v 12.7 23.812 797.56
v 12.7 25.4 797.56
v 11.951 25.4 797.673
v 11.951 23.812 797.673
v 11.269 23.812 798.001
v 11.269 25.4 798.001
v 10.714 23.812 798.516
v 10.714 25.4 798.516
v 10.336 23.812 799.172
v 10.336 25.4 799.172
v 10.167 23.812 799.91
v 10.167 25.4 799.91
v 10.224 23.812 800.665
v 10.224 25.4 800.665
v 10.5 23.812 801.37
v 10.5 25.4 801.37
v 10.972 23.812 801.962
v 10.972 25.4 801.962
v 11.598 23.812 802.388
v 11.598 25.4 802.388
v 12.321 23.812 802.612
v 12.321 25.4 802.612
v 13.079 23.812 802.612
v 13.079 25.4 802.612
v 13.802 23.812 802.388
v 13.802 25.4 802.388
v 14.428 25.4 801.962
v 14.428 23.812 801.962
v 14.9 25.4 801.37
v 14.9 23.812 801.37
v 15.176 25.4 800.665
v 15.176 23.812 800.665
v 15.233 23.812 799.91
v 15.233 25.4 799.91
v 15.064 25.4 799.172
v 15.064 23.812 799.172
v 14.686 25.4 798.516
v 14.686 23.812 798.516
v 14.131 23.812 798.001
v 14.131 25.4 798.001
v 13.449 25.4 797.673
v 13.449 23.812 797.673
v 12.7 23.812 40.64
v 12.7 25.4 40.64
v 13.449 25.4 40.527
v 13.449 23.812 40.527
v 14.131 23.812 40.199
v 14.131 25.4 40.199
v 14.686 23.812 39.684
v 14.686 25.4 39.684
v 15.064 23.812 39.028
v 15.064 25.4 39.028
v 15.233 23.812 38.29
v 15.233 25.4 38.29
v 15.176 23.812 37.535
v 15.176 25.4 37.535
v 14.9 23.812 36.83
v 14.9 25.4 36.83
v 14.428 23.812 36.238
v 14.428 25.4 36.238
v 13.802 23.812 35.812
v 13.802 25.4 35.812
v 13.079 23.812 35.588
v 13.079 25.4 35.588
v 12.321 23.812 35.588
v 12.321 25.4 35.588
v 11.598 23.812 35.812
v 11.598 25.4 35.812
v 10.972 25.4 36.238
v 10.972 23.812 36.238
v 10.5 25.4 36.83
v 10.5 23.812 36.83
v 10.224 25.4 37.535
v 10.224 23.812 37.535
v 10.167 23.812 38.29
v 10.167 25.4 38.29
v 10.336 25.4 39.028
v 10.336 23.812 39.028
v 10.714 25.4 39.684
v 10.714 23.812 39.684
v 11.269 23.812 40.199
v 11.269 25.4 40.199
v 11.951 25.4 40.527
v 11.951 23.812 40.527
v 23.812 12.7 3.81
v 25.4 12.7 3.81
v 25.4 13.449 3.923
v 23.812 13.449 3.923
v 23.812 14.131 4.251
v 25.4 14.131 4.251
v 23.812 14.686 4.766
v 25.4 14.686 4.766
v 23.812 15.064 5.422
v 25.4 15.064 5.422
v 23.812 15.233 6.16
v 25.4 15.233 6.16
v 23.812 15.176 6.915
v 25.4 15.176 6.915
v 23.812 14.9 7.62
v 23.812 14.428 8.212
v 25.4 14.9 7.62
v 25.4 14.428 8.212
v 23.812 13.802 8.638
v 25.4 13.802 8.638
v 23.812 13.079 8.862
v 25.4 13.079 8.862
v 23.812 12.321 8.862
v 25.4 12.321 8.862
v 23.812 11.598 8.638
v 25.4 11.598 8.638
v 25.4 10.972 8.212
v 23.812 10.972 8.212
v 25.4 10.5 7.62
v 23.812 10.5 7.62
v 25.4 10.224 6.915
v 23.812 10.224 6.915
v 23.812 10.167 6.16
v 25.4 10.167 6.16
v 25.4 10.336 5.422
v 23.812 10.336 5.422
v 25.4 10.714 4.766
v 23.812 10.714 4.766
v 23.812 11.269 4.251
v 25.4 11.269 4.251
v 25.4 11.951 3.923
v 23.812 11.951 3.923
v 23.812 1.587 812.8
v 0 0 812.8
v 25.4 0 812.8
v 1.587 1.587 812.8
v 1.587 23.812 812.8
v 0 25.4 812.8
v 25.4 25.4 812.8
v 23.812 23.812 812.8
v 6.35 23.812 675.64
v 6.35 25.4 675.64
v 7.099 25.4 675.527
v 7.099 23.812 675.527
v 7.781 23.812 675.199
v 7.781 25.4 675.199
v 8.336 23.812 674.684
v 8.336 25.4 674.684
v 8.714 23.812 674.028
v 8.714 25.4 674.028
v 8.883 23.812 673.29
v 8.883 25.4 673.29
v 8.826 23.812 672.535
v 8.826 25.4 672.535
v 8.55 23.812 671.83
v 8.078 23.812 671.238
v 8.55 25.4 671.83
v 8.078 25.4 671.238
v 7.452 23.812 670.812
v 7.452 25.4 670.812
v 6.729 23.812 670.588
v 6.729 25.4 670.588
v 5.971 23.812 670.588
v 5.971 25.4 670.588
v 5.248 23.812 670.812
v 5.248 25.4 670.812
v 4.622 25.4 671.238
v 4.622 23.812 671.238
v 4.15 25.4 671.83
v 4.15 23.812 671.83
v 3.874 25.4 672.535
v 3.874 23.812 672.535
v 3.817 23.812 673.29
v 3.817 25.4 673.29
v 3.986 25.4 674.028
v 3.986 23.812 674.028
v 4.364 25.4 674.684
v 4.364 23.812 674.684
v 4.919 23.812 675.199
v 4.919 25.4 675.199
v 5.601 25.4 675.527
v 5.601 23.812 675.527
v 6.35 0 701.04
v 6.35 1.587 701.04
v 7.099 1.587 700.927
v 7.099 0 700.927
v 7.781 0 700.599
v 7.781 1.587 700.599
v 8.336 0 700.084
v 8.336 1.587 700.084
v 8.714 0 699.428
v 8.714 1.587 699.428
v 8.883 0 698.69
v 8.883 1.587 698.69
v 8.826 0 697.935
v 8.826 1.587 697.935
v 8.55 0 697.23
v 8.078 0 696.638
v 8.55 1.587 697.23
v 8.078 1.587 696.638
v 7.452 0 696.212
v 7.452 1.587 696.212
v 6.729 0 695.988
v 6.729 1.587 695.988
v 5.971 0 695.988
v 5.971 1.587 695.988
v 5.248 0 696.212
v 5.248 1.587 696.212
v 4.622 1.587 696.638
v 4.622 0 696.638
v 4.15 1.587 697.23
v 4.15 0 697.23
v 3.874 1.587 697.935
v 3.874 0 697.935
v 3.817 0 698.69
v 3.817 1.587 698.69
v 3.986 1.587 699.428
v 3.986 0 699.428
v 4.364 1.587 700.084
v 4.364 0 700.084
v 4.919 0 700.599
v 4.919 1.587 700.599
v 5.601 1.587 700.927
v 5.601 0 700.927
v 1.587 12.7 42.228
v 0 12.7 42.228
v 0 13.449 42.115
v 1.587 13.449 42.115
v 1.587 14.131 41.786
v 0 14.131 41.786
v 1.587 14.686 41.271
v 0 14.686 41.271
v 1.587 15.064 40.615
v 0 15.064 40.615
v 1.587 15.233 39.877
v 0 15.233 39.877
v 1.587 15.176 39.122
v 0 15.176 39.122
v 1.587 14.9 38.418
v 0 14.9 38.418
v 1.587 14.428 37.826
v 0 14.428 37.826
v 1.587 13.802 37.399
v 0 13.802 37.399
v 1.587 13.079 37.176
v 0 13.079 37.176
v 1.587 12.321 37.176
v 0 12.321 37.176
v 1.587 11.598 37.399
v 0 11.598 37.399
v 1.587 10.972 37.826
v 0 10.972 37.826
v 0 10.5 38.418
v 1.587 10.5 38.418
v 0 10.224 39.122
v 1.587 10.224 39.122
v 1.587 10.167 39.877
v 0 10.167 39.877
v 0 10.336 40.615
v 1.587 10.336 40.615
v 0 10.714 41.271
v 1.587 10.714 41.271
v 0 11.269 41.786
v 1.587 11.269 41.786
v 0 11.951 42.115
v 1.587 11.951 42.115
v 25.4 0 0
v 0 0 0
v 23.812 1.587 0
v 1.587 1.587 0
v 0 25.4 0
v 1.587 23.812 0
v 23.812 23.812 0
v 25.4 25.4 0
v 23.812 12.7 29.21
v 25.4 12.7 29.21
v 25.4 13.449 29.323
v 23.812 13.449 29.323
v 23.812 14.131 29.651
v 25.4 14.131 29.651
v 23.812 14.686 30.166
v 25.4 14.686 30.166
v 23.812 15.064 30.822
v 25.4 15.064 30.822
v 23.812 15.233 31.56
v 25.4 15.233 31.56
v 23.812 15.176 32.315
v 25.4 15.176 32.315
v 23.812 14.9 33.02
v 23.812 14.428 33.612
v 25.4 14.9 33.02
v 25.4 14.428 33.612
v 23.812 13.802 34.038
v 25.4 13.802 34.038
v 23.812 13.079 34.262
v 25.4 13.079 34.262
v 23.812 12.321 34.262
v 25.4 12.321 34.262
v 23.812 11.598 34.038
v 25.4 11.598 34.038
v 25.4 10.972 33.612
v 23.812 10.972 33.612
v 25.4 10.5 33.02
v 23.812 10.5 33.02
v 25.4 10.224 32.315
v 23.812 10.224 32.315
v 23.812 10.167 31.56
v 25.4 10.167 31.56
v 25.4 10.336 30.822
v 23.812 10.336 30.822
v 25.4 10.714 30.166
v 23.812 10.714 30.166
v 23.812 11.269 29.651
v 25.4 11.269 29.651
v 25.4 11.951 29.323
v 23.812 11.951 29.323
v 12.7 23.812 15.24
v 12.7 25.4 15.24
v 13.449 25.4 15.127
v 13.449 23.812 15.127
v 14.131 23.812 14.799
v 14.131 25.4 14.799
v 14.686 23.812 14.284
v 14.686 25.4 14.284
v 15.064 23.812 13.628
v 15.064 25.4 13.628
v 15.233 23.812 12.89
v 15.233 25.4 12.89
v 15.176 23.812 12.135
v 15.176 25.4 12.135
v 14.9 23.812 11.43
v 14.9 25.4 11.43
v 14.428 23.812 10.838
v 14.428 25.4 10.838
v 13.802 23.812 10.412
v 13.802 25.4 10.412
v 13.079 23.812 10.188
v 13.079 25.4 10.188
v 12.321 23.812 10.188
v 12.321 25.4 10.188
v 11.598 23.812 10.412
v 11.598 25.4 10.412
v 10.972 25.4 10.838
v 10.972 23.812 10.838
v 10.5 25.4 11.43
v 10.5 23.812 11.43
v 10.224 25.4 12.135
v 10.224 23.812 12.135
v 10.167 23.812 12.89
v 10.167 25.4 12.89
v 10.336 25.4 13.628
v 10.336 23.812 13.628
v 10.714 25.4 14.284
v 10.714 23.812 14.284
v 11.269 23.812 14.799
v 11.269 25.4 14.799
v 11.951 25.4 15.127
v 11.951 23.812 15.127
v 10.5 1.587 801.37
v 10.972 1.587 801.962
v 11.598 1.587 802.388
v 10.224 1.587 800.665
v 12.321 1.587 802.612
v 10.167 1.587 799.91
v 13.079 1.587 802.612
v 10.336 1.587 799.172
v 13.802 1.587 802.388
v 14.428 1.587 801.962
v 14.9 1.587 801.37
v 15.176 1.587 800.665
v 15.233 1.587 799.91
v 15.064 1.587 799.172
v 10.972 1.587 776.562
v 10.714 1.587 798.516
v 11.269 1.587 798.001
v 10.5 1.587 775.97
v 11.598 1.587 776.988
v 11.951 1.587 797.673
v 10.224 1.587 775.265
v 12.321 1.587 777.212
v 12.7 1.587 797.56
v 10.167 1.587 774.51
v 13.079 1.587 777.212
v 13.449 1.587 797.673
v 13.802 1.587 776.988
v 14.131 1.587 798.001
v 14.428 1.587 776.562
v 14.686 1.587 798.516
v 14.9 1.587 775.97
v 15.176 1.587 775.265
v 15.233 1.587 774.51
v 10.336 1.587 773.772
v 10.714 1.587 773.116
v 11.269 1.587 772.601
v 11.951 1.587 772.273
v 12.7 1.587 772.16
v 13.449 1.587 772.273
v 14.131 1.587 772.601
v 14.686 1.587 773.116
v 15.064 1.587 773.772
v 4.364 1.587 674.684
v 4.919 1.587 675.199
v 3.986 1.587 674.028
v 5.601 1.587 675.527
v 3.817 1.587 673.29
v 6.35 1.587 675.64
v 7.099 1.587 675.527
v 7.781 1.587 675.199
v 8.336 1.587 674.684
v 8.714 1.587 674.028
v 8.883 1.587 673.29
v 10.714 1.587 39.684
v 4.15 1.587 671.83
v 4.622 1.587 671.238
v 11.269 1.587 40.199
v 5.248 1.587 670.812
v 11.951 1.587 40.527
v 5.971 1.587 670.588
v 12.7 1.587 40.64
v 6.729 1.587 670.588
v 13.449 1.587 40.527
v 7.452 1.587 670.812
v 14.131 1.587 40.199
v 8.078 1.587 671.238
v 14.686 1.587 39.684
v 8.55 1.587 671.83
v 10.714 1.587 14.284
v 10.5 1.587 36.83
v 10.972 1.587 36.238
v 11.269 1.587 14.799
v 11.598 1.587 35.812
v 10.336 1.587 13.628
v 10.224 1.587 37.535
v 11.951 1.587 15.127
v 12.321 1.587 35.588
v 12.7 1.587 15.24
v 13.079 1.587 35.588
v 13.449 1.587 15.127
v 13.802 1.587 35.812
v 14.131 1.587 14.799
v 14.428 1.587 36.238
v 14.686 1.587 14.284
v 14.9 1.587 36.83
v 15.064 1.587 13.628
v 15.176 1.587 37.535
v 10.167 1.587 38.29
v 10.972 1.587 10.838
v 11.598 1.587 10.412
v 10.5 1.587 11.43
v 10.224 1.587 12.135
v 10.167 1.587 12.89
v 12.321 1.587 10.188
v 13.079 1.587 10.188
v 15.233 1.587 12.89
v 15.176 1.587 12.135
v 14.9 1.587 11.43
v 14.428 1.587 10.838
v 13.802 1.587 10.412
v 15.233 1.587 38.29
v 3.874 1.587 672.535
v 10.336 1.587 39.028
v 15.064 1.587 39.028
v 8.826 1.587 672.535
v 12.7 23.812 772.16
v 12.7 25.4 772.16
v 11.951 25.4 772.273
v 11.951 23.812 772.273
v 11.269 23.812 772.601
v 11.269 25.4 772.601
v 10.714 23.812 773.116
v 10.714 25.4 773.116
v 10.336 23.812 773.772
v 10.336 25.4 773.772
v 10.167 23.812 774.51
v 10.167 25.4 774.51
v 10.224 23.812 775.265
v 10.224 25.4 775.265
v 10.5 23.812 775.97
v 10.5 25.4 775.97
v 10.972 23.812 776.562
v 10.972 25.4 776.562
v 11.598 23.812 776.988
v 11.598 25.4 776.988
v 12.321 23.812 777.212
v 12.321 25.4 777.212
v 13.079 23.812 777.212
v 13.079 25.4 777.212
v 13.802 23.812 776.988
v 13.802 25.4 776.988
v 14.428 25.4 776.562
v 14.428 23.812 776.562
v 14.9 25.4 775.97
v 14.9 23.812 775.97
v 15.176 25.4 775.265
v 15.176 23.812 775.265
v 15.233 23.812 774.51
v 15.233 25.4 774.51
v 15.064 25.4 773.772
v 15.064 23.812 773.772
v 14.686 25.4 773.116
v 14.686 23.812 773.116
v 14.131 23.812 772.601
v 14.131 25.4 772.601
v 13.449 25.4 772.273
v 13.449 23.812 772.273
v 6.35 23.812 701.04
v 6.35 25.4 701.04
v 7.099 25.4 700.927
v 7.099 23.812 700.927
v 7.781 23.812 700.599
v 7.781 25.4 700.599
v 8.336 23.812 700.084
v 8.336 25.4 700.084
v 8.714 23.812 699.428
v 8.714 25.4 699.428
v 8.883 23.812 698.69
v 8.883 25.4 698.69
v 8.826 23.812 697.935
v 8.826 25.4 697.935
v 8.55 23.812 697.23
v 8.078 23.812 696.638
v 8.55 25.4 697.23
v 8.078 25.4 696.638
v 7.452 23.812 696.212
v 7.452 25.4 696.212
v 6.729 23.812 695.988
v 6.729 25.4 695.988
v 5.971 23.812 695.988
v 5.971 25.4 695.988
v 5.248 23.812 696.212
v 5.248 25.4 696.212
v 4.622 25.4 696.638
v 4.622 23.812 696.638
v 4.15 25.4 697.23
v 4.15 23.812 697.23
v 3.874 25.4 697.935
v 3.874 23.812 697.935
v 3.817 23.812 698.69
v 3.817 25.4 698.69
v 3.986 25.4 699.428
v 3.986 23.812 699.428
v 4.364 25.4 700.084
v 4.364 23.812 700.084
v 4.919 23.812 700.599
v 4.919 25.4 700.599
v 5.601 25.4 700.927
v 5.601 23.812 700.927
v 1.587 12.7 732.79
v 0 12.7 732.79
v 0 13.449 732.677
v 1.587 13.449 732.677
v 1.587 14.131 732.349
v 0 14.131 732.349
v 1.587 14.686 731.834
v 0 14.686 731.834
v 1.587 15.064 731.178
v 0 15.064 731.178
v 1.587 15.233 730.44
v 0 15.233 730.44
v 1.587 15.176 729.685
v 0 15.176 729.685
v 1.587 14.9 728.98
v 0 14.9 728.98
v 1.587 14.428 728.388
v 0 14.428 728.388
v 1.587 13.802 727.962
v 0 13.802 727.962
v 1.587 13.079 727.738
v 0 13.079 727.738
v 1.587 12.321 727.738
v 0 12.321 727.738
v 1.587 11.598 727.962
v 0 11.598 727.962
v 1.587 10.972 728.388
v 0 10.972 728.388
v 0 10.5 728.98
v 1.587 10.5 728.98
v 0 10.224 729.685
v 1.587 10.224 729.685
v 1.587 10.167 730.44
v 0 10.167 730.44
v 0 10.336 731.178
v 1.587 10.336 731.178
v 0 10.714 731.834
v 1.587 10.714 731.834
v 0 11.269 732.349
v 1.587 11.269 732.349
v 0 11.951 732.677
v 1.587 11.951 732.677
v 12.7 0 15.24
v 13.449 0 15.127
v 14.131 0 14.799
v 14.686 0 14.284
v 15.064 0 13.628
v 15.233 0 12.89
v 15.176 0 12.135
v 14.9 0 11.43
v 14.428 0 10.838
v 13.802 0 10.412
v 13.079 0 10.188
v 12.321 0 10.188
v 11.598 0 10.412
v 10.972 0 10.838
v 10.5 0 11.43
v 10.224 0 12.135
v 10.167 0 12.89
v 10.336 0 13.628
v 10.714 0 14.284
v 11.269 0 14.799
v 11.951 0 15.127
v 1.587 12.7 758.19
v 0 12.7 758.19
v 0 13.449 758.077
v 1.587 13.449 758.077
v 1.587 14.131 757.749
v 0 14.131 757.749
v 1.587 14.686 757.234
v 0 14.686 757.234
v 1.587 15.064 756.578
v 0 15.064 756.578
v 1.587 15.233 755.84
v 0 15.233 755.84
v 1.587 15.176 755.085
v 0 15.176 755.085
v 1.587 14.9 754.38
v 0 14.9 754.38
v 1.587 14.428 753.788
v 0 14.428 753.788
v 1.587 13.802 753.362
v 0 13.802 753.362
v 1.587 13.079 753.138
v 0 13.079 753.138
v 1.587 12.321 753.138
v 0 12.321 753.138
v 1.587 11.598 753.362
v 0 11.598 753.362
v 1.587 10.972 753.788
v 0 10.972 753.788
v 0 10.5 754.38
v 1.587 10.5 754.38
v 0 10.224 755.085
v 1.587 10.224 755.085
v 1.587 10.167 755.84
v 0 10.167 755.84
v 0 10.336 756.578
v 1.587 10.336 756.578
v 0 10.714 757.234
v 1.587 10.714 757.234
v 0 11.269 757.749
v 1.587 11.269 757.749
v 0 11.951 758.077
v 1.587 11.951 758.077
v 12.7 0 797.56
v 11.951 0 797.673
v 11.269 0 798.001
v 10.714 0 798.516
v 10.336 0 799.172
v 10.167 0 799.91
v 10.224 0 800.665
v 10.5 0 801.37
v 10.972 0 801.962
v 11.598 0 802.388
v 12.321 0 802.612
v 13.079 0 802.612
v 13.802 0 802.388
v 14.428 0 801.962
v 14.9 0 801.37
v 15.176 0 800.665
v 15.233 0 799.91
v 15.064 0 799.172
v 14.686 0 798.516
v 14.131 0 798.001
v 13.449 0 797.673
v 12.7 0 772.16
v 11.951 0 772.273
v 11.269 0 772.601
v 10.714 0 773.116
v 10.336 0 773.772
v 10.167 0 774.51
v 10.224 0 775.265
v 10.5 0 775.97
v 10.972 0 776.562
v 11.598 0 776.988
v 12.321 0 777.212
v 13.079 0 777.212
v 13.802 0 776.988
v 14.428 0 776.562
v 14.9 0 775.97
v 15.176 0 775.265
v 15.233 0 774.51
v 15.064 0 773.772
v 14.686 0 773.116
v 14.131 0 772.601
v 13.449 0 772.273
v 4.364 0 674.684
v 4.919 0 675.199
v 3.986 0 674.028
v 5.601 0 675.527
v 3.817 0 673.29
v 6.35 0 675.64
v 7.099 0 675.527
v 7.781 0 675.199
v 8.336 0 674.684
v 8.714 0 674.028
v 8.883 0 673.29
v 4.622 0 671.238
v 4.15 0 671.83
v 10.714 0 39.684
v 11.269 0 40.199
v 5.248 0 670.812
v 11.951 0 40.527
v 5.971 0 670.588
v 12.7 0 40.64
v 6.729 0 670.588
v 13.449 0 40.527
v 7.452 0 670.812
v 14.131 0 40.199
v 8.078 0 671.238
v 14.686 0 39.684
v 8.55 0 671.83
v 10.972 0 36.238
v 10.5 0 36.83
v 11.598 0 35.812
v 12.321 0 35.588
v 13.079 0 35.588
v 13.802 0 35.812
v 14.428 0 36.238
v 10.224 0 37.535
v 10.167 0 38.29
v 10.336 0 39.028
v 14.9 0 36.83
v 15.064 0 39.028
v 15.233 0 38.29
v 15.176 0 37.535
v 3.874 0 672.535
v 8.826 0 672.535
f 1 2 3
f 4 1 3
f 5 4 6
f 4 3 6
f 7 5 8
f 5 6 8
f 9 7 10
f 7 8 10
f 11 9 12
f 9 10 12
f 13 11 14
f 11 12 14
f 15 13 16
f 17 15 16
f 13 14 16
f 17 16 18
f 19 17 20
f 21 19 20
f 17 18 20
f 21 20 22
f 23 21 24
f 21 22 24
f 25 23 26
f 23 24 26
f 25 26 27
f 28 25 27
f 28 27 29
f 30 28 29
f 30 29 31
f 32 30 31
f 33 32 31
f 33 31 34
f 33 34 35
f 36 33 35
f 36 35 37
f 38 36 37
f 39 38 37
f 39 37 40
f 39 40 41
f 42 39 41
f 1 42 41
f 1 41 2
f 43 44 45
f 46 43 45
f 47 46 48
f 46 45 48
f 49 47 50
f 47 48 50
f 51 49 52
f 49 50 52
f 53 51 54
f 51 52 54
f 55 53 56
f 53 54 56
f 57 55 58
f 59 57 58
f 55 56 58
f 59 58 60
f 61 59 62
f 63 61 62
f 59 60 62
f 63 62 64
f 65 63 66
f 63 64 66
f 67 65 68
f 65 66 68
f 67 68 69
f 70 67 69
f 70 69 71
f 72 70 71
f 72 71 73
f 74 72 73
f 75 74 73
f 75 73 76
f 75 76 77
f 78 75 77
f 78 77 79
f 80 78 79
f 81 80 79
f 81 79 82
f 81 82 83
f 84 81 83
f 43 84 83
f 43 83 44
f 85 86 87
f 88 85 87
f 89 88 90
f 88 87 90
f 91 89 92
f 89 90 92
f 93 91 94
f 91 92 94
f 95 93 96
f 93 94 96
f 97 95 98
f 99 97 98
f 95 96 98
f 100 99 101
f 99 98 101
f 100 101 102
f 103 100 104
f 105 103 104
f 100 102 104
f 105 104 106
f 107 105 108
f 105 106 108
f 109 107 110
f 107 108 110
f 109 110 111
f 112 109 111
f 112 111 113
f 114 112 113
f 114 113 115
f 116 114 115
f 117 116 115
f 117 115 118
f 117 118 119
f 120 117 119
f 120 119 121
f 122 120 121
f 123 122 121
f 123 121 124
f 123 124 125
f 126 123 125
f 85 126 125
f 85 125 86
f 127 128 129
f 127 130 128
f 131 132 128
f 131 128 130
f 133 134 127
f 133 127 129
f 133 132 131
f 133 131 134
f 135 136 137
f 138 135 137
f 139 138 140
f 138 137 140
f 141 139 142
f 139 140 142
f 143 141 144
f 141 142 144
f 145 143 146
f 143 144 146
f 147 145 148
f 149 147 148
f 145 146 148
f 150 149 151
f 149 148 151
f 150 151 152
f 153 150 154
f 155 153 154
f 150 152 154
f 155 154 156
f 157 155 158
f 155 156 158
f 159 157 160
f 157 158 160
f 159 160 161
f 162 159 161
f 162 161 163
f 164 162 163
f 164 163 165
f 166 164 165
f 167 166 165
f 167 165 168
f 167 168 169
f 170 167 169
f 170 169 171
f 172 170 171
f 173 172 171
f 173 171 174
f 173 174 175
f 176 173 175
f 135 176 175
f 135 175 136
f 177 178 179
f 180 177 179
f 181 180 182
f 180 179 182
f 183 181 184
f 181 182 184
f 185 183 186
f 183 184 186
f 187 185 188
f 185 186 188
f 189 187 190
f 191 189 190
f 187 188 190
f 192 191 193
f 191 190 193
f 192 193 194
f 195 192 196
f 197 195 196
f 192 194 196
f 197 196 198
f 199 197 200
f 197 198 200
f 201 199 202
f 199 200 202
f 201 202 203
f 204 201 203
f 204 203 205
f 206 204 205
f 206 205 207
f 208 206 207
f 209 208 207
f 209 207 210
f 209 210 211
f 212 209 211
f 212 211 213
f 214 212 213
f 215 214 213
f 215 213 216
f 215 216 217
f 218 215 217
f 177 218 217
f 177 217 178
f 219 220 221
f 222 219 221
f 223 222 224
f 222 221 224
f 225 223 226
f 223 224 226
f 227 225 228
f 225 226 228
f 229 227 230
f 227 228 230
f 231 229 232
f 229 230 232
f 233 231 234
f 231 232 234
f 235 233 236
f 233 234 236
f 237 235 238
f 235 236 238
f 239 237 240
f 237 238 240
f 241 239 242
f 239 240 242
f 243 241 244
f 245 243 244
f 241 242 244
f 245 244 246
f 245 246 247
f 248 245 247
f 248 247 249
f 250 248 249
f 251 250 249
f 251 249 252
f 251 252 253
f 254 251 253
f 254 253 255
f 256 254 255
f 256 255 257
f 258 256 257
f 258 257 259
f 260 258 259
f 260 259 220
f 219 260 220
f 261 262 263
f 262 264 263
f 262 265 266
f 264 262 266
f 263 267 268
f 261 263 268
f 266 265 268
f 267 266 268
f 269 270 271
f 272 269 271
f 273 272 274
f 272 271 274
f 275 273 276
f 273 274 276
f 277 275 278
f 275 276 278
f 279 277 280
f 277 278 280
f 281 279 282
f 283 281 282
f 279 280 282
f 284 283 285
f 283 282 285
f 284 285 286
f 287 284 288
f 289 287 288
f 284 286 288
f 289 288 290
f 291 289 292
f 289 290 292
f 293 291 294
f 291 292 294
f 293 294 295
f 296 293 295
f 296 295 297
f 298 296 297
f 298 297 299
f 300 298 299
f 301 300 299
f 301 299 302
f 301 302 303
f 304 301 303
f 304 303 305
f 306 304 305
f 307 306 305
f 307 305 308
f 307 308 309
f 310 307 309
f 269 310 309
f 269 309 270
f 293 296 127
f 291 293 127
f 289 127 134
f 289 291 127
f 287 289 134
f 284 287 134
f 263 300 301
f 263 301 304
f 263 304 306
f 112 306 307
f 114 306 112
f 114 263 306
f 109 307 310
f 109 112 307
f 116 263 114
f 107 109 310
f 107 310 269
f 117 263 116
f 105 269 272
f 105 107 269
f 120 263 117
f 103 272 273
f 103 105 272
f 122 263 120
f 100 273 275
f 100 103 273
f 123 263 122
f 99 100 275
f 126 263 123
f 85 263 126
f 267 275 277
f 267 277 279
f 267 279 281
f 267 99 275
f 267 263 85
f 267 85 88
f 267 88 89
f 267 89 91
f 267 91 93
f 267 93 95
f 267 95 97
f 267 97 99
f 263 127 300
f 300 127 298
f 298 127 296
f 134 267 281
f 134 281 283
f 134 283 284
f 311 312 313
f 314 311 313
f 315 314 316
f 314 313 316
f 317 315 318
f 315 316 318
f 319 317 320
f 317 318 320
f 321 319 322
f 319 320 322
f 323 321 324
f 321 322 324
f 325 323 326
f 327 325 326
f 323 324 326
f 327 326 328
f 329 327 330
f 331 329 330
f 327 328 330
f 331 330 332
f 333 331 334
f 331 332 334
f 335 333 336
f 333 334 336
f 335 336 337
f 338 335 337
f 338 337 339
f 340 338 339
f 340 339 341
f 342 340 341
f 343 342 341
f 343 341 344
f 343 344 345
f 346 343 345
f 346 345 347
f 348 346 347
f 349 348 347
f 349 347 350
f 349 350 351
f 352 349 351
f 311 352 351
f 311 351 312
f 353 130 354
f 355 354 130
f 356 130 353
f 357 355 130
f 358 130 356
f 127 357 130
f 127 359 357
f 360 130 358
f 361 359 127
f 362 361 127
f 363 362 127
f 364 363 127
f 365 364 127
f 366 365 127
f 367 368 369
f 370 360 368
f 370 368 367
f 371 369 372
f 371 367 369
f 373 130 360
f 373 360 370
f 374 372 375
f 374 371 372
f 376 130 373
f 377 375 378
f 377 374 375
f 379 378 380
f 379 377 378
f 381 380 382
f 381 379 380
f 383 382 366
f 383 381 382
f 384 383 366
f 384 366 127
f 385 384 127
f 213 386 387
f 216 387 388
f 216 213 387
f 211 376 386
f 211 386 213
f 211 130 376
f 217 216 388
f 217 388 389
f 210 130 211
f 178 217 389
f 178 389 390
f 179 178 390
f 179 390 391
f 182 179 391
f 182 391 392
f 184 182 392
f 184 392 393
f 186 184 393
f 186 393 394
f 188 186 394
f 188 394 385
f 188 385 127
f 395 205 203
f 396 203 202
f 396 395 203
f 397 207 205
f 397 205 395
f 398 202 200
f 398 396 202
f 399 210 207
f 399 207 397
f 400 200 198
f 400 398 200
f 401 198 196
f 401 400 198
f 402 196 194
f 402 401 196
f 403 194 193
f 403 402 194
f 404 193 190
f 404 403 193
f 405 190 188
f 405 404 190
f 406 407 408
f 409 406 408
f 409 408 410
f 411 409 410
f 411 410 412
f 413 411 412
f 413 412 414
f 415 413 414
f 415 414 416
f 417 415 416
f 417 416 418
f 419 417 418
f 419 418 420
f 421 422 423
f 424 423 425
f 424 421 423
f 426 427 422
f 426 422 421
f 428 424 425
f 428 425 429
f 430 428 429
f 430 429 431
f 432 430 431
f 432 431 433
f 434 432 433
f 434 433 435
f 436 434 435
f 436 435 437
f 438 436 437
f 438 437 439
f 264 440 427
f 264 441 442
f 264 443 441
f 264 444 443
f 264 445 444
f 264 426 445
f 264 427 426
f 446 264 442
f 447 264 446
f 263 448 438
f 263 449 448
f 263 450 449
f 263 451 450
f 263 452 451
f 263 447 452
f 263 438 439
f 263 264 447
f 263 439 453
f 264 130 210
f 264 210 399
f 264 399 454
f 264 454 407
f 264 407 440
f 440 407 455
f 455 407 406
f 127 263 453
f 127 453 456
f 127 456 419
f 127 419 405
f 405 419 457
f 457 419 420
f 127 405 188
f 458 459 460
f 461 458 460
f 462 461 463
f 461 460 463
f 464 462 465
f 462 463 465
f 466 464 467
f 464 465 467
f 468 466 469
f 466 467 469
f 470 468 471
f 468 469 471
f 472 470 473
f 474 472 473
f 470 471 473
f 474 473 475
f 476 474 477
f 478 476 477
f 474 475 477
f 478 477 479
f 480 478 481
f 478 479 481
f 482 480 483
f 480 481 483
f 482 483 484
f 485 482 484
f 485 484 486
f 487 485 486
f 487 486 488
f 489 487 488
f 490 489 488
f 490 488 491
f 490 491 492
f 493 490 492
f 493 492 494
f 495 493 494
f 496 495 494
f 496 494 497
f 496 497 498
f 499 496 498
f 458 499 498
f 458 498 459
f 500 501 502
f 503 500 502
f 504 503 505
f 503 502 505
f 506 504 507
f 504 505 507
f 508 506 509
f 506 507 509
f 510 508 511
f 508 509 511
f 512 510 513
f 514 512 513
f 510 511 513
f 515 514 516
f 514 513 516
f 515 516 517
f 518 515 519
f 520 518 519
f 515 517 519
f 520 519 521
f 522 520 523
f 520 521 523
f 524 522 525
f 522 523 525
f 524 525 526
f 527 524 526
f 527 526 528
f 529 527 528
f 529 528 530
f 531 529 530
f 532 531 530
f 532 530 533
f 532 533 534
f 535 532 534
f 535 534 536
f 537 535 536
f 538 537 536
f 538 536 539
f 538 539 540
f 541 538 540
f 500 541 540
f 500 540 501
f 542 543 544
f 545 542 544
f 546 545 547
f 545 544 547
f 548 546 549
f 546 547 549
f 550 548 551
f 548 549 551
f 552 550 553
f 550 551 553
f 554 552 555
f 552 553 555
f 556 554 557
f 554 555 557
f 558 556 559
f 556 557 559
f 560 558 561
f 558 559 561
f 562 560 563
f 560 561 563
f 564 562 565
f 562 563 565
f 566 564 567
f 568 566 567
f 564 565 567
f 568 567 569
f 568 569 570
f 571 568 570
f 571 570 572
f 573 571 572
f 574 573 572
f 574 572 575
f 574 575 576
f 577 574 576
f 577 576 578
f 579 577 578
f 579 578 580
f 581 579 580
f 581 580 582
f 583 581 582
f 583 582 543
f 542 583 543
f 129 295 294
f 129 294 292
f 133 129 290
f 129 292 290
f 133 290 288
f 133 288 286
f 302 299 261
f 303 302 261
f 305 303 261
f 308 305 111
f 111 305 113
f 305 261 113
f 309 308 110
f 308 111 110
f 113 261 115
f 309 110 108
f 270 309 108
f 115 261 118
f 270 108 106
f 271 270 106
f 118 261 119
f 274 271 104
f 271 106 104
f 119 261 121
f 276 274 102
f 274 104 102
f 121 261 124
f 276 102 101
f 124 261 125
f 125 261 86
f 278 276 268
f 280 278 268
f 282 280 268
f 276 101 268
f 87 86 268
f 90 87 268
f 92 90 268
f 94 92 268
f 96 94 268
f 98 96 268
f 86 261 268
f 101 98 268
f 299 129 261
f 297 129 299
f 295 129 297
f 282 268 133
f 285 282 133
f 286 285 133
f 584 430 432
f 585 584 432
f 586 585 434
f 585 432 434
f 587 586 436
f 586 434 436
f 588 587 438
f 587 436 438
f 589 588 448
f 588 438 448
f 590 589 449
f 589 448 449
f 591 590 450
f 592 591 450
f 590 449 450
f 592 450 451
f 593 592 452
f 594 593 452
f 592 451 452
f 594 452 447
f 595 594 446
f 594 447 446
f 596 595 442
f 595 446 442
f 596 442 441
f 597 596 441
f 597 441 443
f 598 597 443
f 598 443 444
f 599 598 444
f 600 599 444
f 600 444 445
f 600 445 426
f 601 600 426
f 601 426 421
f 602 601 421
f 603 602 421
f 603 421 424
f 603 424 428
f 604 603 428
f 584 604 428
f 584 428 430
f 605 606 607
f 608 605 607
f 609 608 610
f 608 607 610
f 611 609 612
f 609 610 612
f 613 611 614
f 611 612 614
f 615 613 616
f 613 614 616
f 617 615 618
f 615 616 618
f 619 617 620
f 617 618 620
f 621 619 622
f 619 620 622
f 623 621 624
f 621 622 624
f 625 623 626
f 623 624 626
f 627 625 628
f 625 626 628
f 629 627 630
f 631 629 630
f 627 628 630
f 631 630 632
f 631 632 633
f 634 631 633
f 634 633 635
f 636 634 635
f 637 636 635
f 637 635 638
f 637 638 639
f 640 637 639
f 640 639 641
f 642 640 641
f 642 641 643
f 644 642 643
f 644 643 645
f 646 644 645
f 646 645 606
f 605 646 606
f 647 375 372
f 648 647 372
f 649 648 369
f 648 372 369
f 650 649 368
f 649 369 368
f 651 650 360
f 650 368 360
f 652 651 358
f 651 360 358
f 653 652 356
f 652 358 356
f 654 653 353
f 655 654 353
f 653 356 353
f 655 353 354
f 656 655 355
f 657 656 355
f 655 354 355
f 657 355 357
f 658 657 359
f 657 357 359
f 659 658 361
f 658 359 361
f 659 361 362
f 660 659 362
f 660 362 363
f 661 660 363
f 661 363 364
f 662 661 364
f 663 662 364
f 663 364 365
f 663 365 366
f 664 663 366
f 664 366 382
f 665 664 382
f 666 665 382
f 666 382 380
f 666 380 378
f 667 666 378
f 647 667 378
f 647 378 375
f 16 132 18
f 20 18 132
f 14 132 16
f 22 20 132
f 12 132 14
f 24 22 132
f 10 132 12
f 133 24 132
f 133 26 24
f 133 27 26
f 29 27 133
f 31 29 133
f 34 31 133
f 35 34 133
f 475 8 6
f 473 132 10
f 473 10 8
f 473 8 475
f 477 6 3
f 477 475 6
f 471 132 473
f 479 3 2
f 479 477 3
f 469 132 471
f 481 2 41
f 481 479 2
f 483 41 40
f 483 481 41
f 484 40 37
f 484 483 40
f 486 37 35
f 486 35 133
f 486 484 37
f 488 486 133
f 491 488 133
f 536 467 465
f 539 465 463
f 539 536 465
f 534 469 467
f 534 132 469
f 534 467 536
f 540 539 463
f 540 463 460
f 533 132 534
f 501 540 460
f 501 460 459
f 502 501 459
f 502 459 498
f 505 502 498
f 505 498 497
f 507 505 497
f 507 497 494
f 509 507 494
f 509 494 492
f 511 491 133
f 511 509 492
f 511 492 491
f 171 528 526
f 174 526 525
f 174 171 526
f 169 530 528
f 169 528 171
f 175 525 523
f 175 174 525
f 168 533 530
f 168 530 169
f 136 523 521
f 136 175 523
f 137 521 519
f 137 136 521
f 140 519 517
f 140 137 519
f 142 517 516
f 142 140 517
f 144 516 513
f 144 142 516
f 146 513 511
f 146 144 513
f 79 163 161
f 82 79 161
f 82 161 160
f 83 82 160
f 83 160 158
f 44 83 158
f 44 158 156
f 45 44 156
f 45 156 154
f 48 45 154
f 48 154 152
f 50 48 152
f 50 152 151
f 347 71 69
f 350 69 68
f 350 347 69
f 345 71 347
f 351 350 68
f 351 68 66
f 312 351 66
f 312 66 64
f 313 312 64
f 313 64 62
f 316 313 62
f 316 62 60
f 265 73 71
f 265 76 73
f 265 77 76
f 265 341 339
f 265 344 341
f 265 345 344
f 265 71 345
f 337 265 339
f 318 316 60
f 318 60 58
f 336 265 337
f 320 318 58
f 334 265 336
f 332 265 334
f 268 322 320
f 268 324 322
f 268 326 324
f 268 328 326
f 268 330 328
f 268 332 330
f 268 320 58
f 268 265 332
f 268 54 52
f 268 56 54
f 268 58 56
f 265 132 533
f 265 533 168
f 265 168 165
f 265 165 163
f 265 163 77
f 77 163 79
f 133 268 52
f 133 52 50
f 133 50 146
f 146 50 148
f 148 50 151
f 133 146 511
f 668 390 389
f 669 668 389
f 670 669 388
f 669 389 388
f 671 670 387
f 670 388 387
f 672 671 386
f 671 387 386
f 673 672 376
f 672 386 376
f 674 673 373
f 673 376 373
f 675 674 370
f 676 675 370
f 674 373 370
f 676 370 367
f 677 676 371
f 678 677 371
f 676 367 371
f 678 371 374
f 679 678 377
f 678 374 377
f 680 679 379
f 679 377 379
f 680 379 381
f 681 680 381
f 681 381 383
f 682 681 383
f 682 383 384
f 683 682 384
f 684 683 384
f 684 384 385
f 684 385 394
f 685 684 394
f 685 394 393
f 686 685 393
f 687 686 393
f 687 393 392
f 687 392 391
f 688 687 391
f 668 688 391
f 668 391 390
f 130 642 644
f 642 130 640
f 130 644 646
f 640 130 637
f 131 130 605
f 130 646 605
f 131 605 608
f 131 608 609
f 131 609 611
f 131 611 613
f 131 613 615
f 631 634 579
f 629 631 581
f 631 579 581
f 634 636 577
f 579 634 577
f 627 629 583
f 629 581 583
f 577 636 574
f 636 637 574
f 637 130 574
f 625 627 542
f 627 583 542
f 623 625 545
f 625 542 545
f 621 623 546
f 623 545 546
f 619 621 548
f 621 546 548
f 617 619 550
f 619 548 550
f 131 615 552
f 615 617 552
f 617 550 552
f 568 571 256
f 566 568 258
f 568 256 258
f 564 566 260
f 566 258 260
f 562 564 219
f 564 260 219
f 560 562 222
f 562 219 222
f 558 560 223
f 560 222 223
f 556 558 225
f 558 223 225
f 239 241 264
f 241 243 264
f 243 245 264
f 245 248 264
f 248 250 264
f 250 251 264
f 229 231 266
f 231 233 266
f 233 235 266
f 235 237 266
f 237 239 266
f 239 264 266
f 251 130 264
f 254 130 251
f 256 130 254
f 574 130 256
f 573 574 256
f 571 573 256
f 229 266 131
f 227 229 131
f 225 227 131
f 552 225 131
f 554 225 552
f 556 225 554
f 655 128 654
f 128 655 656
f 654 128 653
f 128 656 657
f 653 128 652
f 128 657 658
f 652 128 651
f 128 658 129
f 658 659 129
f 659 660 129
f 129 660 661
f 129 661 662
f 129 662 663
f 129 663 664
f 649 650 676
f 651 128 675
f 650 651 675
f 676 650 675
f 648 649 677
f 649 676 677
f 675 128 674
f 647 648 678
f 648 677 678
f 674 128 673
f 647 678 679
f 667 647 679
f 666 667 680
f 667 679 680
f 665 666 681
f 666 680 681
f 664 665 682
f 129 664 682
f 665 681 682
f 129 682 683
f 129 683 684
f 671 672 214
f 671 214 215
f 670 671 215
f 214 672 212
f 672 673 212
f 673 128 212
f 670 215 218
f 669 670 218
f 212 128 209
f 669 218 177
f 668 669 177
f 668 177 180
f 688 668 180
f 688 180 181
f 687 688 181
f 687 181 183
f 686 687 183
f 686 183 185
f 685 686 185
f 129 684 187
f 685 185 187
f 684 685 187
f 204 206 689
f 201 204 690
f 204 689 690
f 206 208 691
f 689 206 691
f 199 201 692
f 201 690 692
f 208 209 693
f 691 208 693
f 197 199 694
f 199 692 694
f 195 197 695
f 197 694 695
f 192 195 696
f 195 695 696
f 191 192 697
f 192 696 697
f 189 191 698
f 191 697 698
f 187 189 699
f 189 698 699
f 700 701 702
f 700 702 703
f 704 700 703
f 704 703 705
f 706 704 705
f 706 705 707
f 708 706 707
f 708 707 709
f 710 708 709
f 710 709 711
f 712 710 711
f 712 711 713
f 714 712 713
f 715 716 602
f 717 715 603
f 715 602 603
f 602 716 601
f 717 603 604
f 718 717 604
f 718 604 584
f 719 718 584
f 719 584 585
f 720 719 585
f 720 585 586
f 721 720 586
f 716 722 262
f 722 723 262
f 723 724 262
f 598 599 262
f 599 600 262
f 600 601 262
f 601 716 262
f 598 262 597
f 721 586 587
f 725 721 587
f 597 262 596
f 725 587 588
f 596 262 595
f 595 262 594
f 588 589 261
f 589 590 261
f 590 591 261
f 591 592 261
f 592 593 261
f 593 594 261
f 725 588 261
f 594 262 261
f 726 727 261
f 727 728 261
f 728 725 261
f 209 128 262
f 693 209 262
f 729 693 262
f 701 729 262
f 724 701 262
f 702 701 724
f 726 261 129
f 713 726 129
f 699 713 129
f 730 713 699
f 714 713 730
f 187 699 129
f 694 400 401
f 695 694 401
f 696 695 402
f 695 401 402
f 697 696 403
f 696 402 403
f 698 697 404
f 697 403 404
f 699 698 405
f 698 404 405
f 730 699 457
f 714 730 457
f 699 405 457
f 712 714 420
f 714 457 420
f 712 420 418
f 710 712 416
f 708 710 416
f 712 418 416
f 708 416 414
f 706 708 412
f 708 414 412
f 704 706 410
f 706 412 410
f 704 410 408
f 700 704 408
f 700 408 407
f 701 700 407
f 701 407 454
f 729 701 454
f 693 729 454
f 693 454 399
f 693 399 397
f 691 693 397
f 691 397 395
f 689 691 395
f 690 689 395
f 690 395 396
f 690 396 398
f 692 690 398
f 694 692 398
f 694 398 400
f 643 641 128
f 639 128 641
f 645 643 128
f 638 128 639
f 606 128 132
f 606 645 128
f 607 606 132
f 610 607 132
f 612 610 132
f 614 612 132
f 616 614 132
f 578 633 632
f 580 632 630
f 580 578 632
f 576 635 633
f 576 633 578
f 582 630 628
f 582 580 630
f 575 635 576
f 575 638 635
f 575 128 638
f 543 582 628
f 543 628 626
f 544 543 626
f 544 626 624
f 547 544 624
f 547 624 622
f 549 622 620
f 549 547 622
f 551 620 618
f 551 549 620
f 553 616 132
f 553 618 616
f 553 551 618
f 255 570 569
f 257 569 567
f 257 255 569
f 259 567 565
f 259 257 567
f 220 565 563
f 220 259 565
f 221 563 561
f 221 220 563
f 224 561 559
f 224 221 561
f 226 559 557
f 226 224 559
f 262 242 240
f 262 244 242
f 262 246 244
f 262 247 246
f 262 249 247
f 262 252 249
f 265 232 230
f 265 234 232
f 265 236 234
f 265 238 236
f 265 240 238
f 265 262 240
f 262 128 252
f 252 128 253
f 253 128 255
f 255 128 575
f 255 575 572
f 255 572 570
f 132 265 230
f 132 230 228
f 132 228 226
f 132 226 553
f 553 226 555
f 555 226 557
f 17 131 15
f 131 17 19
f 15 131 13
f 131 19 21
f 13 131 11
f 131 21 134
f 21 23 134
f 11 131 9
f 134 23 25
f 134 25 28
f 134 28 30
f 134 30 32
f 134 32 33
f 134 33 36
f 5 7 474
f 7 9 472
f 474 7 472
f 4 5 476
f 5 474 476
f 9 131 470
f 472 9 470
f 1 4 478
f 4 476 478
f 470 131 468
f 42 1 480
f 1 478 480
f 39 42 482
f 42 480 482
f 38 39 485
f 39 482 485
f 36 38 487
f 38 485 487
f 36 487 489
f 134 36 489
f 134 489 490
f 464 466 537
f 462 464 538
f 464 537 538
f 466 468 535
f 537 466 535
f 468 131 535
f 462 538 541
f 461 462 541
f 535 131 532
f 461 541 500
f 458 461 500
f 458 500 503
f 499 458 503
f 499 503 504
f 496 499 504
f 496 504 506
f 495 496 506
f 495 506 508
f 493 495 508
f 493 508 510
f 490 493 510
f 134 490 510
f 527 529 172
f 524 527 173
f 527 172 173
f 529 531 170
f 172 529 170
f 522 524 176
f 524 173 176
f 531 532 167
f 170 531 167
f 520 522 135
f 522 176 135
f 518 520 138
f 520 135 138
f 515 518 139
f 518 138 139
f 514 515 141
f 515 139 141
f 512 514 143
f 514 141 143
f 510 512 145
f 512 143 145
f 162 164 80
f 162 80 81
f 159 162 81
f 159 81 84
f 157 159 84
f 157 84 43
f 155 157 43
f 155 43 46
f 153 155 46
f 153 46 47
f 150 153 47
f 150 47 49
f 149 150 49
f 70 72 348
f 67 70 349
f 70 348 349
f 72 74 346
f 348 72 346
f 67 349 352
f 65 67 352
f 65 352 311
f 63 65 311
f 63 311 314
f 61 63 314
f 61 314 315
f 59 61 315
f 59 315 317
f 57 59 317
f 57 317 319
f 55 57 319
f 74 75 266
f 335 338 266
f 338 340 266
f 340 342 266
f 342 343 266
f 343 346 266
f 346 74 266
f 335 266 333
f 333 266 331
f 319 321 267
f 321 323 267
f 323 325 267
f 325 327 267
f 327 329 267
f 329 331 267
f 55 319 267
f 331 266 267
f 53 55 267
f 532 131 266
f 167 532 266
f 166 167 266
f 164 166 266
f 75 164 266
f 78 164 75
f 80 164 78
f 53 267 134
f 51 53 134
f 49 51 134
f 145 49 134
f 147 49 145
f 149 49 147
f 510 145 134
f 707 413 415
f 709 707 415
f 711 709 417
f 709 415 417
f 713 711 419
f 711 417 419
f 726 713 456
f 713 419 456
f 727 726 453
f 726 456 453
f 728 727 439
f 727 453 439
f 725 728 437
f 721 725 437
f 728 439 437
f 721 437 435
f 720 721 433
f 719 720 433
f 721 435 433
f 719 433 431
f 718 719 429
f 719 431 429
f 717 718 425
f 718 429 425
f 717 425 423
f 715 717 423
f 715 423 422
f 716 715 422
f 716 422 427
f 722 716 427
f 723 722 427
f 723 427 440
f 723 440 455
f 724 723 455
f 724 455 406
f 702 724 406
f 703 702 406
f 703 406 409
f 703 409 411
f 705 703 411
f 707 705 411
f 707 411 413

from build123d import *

# Parameters (mm, degrees)
SKETCH1_W           = 25.4
SKETCH1_H           = 25.4
SKETCH1_W_2         = 22.225
SKETCH1_H_2         = 22.225
BOSS_EXTRUDE1_DEPTH = 812.8
SKETCH3_R           = 2.54
CUT_EXTRUDE2_DEPTH  = 814.593362805
CUT_EXTRUDE3_REACH  = 815.593
SKETCH4_R           = 2.54
CUT_EXTRUDE4_REACH  = 815.593
SKETCH5_R           = 2.54


with BuildPart() as part:
    # Sketch1 → Boss-Extrude1 (new body)
    with BuildSketch(Plane.XY):
        with Locations((12.7, 12.7)):
            Rectangle(SKETCH1_W, SKETCH1_H)
        with Locations((12.7, 12.7)):
            Rectangle(SKETCH1_W_2, SKETCH1_H_2, mode=Mode.SUBTRACT)
    extrude(amount=BOSS_EXTRUDE1_DEPTH)

    # Sketch3 → Cut-Extrude2 (cut, through all)
    with BuildSketch(Plane(origin=(0, 25.4, 0), x_dir=(1, 0, 0), z_dir=(0, 1, 0))):
        with Locations(Location((12.7, -12.7, 0), (0, 0, 270))):
            Circle(SKETCH3_R)
        with Locations(Location((12.7, -38.1, 0), (0, 0, 270))):
            Circle(SKETCH3_R)
        with Locations(Location((12.7, -774.7, 0), (0, 0, 90))):
            Circle(SKETCH3_R)
        with Locations(Location((12.7, -800.1, 0), (0, 0, 90))):
            Circle(SKETCH3_R)
        with Locations(Location((6.35, -698.5, 0), (0, 0, 270))):
            Circle(SKETCH3_R)
        with Locations(Location((6.35, -673.1, 0), (0, 0, 270))):
            Circle(SKETCH3_R)
    extrude(amount=-CUT_EXTRUDE2_DEPTH, mode=Mode.SUBTRACT)

    # Sketch4 → Cut-Extrude3 (cut, up to next)
    with BuildSketch(Plane(origin=(25.4, 0, 0), x_dir=(0, 0, -1), z_dir=(1, 0, 0)), mode=Mode.PRIVATE) as cut_extrude3_sk1:
        with Locations((-6.35, 12.7)):
            Circle(SKETCH4_R)
    cut_extrude3_tool1 = extrude(cut_extrude3_sk1.sketch, amount=-CUT_EXTRUDE3_REACH, mode=Mode.PRIVATE) & part.part
    # Sketch4 → Cut-Extrude3 (cut, up to next)
    with BuildSketch(Plane(origin=(25.4, 0, 0), x_dir=(0, 0, -1), z_dir=(1, 0, 0)), mode=Mode.PRIVATE) as cut_extrude3_sk2:
        with Locations((-31.75, 12.7)):
            Circle(SKETCH4_R)
    cut_extrude3_tool2 = extrude(cut_extrude3_sk2.sketch, amount=-CUT_EXTRUDE3_REACH, mode=Mode.PRIVATE) & part.part
    add(cut_extrude3_tool1.solids().sort_by_distance((25.4, 12.7, 6.35))[0], mode=Mode.SUBTRACT)
    add(cut_extrude3_tool2.solids().sort_by_distance((25.4, 12.7, 31.75))[0], mode=Mode.SUBTRACT)

    # Sketch5 → Cut-Extrude4 (cut, up to next)
    with BuildSketch(Plane.ZY, mode=Mode.PRIVATE) as cut_extrude4_sk1:
        with Locations((39.6875, 12.7)):
            Circle(SKETCH5_R)
    cut_extrude4_tool1 = extrude(cut_extrude4_sk1.sketch, amount=-CUT_EXTRUDE4_REACH, mode=Mode.PRIVATE) & part.part
    # Sketch5 → Cut-Extrude4 (cut, up to next)
    with BuildSketch(Plane.ZY, mode=Mode.PRIVATE) as cut_extrude4_sk2:
        with Locations((730.25, 12.7)):
            Circle(SKETCH5_R)
    cut_extrude4_tool2 = extrude(cut_extrude4_sk2.sketch, amount=-CUT_EXTRUDE4_REACH, mode=Mode.PRIVATE) & part.part
    # Sketch5 → Cut-Extrude4 (cut, up to next)
    with BuildSketch(Plane.ZY, mode=Mode.PRIVATE) as cut_extrude4_sk3:
        with Locations((755.65, 12.7)):
            Circle(SKETCH5_R)
    cut_extrude4_tool3 = extrude(cut_extrude4_sk3.sketch, amount=-CUT_EXTRUDE4_REACH, mode=Mode.PRIVATE) & part.part
    add(cut_extrude4_tool1.solids().sort_by_distance((0, 12.7, 39.6875))[0], mode=Mode.SUBTRACT)
    add(cut_extrude4_tool2.solids().sort_by_distance((0, 12.7, 730.25))[0], mode=Mode.SUBTRACT)
    add(cut_extrude4_tool3.solids().sort_by_distance((0, 12.7, 755.65))[0], mode=Mode.SUBTRACT)


solid = part.part
